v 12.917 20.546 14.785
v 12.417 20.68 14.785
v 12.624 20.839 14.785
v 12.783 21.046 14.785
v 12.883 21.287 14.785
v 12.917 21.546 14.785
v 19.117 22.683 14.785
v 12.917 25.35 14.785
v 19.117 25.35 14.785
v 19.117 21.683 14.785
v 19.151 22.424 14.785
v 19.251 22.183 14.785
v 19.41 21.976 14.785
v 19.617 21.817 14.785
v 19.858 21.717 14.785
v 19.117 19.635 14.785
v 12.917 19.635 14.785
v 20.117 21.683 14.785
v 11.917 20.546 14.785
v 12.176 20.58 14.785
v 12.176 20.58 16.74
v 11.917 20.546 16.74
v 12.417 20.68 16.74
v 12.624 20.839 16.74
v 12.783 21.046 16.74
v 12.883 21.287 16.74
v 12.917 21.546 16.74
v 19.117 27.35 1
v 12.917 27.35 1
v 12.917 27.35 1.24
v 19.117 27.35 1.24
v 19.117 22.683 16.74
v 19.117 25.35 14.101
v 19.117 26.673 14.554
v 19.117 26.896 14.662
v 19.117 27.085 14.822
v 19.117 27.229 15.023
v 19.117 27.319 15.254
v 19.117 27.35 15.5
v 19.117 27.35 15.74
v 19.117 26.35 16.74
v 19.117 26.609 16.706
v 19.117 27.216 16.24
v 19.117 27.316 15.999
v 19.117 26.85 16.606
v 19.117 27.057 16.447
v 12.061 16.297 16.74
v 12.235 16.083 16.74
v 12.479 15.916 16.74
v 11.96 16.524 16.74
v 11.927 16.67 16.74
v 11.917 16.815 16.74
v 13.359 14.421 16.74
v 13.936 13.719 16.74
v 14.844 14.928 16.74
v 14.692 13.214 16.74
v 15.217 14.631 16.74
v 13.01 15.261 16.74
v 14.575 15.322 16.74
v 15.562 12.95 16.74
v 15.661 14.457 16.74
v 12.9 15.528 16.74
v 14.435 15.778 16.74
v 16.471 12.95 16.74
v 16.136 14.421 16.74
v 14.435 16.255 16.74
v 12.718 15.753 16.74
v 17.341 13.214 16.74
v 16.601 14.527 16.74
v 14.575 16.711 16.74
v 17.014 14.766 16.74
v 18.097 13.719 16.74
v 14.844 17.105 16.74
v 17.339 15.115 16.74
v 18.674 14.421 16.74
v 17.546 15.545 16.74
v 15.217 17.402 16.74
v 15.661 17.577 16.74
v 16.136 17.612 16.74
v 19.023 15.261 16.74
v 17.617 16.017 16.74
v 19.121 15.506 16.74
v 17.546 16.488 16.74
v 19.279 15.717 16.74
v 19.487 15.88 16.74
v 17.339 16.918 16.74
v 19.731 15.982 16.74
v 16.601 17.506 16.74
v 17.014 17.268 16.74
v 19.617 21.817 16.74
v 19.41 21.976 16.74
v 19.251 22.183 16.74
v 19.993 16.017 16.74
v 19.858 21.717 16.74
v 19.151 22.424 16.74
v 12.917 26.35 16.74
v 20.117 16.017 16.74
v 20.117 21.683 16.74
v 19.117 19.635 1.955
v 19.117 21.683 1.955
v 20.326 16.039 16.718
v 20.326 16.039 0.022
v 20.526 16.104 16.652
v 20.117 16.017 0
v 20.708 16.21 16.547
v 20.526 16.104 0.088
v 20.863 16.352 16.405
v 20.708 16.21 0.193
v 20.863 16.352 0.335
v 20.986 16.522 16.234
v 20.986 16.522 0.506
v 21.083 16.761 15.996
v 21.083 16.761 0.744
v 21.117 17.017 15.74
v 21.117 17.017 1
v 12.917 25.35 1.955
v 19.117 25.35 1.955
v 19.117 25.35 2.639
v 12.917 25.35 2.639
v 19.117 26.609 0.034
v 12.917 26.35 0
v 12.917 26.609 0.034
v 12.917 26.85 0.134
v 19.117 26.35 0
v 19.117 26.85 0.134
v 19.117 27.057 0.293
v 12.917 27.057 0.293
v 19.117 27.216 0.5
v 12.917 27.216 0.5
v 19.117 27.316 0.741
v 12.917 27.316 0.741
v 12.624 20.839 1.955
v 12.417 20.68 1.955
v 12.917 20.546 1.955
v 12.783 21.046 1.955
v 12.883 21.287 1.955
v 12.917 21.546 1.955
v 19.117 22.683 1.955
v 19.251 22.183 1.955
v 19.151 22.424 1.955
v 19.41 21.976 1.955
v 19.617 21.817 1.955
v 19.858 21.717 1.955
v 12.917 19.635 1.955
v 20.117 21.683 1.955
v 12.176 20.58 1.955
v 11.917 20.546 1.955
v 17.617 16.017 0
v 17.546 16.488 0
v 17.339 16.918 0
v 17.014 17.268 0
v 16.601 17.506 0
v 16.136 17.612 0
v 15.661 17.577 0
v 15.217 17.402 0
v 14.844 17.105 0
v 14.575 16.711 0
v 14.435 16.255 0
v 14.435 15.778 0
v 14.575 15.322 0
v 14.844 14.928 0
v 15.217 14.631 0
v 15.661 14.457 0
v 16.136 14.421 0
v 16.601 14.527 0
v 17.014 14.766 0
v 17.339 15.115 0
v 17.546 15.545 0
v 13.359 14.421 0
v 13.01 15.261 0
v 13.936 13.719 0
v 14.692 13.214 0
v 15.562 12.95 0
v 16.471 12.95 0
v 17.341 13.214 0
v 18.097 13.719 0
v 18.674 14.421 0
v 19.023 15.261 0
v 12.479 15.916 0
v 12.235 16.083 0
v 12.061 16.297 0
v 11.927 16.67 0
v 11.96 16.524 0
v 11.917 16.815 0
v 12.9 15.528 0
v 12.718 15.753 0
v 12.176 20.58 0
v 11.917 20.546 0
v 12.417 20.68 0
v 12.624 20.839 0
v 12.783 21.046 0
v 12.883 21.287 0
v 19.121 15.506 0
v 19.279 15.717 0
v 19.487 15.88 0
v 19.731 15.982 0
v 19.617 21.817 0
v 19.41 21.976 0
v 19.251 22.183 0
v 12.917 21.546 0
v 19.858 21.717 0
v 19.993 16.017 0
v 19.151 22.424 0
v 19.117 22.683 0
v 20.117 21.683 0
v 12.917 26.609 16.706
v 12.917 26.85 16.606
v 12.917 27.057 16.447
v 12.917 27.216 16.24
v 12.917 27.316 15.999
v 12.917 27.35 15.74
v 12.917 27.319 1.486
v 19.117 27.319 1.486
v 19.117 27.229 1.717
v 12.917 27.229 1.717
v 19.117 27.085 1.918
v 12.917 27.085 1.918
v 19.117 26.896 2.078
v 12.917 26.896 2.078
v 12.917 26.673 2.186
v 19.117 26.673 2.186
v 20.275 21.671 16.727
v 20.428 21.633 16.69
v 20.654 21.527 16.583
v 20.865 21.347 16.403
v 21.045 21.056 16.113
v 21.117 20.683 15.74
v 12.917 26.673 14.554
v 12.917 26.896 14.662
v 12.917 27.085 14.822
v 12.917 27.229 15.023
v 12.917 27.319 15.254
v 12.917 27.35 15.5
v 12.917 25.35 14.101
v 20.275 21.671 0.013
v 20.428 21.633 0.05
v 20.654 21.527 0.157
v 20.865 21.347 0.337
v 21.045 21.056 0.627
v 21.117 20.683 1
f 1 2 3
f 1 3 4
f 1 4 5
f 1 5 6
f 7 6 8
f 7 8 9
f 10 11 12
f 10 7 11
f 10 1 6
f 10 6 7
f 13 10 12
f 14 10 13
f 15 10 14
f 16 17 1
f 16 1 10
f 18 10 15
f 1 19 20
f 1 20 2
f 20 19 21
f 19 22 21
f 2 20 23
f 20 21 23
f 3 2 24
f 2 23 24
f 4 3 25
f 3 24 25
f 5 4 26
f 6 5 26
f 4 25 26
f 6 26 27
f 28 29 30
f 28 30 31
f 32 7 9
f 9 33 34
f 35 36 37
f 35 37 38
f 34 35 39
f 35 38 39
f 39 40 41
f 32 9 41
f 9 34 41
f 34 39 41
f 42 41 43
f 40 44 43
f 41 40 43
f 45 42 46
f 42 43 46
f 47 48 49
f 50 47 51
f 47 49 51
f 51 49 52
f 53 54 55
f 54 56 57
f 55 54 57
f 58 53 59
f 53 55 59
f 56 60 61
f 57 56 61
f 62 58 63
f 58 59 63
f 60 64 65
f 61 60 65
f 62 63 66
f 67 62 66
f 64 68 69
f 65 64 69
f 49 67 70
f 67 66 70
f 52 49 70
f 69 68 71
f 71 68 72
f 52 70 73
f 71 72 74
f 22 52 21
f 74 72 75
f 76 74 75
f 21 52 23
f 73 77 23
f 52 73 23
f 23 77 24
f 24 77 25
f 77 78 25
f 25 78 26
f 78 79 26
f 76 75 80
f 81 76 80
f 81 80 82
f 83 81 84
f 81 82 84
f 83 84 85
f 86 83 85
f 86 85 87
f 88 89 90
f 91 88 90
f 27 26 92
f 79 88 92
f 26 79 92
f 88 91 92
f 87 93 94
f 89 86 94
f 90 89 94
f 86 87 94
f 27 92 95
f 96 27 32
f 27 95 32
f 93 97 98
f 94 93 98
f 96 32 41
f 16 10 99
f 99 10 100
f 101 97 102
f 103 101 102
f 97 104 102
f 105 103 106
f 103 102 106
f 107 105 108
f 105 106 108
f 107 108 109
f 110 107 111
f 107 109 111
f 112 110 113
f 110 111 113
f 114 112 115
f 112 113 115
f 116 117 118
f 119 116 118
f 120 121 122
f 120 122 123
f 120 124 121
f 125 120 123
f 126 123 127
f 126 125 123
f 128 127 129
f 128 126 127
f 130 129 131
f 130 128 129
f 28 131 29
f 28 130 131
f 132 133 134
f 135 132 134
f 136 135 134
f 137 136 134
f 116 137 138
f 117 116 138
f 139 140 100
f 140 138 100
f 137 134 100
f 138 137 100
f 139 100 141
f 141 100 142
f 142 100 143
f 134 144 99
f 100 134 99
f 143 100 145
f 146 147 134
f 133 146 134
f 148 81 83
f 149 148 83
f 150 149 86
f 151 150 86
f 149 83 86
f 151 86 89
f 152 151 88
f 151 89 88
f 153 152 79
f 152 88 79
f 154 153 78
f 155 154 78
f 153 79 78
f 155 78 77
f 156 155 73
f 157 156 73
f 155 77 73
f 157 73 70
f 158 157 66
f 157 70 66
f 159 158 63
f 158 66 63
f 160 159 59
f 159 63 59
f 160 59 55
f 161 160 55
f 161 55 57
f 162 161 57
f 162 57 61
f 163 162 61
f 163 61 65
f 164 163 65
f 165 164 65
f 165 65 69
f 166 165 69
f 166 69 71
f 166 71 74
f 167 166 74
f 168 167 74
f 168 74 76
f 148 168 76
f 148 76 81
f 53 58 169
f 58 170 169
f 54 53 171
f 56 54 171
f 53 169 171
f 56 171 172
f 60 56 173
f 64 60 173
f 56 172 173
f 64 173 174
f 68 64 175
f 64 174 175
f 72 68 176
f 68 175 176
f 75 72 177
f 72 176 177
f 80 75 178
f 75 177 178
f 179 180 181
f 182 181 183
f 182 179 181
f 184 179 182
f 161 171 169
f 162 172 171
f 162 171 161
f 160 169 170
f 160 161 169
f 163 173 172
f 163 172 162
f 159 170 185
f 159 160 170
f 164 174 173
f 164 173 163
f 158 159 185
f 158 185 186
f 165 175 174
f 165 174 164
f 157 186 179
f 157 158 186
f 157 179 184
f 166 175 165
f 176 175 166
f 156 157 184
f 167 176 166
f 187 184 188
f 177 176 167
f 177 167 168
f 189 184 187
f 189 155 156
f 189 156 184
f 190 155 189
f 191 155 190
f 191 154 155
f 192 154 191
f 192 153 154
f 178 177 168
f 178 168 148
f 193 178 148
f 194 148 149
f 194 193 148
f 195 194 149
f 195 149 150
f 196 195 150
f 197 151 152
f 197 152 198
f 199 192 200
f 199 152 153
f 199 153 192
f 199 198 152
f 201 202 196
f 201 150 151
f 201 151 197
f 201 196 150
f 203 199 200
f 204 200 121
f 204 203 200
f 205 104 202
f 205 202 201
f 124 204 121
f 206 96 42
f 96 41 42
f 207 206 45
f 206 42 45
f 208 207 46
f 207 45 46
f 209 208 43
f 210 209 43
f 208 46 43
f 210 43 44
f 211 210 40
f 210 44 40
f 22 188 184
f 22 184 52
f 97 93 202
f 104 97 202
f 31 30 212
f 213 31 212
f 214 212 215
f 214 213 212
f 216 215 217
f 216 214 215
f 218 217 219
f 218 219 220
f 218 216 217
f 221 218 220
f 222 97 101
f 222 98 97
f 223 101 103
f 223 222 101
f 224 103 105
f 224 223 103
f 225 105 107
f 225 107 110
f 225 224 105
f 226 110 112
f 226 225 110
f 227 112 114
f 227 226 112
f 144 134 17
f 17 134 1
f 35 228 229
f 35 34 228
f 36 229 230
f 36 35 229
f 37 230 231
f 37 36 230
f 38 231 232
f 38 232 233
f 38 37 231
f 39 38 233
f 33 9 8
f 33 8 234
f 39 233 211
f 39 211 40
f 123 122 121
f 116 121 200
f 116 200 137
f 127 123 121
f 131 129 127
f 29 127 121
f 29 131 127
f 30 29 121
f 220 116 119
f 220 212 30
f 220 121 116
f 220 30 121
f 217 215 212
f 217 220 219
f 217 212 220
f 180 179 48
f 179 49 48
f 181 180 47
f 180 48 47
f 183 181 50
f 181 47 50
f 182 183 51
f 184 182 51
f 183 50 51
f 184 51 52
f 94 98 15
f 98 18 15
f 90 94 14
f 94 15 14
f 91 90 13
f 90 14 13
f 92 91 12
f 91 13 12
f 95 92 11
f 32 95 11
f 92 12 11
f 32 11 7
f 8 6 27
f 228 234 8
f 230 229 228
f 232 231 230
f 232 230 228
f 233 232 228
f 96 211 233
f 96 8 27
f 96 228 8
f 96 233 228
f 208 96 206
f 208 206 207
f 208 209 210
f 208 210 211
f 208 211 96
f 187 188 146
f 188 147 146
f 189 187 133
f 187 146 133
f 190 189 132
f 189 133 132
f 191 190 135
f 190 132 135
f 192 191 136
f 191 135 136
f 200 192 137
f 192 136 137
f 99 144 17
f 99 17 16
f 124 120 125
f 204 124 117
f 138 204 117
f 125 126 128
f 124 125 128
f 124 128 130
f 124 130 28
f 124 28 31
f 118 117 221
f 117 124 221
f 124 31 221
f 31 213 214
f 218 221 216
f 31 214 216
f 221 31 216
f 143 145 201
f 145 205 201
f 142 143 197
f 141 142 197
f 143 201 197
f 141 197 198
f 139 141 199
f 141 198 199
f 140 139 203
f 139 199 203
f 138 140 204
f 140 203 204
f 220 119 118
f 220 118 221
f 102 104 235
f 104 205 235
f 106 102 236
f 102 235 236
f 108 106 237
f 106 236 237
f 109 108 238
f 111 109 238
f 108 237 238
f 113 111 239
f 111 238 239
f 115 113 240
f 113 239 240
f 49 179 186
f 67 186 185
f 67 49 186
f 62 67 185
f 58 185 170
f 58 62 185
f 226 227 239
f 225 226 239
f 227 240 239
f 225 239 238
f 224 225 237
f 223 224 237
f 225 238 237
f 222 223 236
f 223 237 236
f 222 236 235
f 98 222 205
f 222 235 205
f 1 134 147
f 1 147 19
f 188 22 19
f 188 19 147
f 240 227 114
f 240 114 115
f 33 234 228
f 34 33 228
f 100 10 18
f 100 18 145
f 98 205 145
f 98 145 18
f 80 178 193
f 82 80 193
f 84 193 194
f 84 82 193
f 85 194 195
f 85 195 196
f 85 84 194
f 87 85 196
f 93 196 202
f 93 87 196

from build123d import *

# Parameters (mm, degrees)
ESBO_O1_R                = 3.1
ESBO_O1_R_2              = 1.55
RESSALTO_EXTRUS_O1_DEPTH = 16.74
BOSS_EXTRUDE1_DEPTH      = 16.74
SKETCH2_W                = 6.2
SKETCH2_H                = 1.955
BOSS_EXTRUDE2_DEPTH      = 7.715
BOSS_EXTRUDE3_DEPTH      = 6.2
SKETCH5_W                = 16.74
SKETCH5_H                = 5.66650546
BOSS_EXTRUDE4_DEPTH      = 2
SKETCH6_W                = 16.74
SKETCH6_H                = 4.529470895
BOSS_EXTRUDE5_DEPTH      = 1
FILLET1_R                = 1
FILLET4_R                = 1
M3_CLEARANCE_HOLE1_D     = 3.2


with BuildPart() as part:
    # Esboço1 → Ressalto-extrusão1 (new body)
    with BuildSketch(Plane.XY):
        with Locations((16.016666667, 16.016666667)):
            Circle(ESBO_O1_R)
        with Locations((16.016666667, 16.016666667)):
            Circle(ESBO_O1_R_2, mode=Mode.SUBTRACT)
    extrude(amount=RESSALTO_EXTRUS_O1_DEPTH)

    # Sketch1 → Boss-Extrude1 (add)
    with BuildSketch(Plane(origin=(0, 0, 0), x_dir=(-1, 0, 0), z_dir=(0, 0, -1))):
        with BuildLine():
            Line((-12.916666667, 16.016666667), (-12.916666667, 19.634677588))
            Line((-12.916666667, 19.634677588), (-19.116666667, 19.634677588))
            Line((-19.116666667, 19.634677588), (-19.116666667, 16.016666667))
            ThreePointArc((-19.116666667, 16.016666667), (-16.016666667, 19.116666667), (-12.916666667, 16.016666667))
        make_face()
    extrude(amount=-BOSS_EXTRUDE1_DEPTH)

    # Sketch2 → Boss-Extrude2 (add)
    with BuildSketch(Plane(origin=(0, 19.634677588, 0), x_dir=(1, 0, 0), z_dir=(0, 1, 0))):
        with Locations((16.016666667, -0.9775)):
            Rectangle(SKETCH2_W, SKETCH2_H)
        with Locations((16.016666667, -15.7625)):
            Rectangle(SKETCH2_W, SKETCH2_H)
    extrude(amount=BOSS_EXTRUDE2_DEPTH)

    # Sketch4 → Boss-Extrude3 (add)
    with BuildSketch(Plane.ZY.offset(-12.916666667)):
        Polygon((1.955, 27.349677588), (1.955, 25.349677588), (2.639300497, 25.349677588), align=None)
        Polygon((14.100699503, 25.349677588), (14.785, 27.349677588), (14.785, 25.349677588), align=None)
    extrude(amount=-BOSS_EXTRUDE3_DEPTH)

    # Sketch5 → Boss-Extrude4 (add)
    with BuildSketch(Plane(origin=(19.116666667, 0, 0), x_dir=(0, 0, -1), z_dir=(1, 0, 0))):
        with Locations((-8.37, 18.849919397)):
            Rectangle(SKETCH5_W, SKETCH5_H)
    extrude(amount=BOSS_EXTRUDE4_DEPTH)

    # Sketch6 → Boss-Extrude5 (add)
    with BuildSketch(Plane.ZY.offset(-12.916666667)):
        with Locations((8.37, 18.281402115)):
            Rectangle(SKETCH6_W, SKETCH6_H)
    extrude(amount=BOSS_EXTRUDE5_DEPTH)

    # Fillet1
    fillet1_edges = [part.edges().sort_by_distance(p)[0] for p in [
        (21.116666667, 21.683172127, 8.37),
        (21.116666667, 18.849919397, 0),
        (21.116666667, 16.016666667, 8.37),
        (21.116666667, 18.849919397, 16.74),
        (16.016666667, 27.349677588, 0),
        (16.016666667, 27.349677588, 1.955),
        (16.016666667, 27.349677588, 16.74),
        (16.016666667, 27.349677588, 14.785),
        (19.116666667, 21.683172127, 15.7625),
        (12.916666667, 20.546137562, 15.7625),
        (12.916666667, 20.546137562, 0.9775),
        (19.116666667, 21.683172127, 0.9775),
        (12.916666667, 16.016666667, 8.37),
        (19.116666667, 16.016666667, 8.37),
    ]]
    fillet(fillet1_edges, radius=FILLET1_R - 0.0001)  # a hair under: the kernel refuses the full size

    # Fillet4
    fillet4_edges = [part.edges().sort_by_distance(p)[0] for p in [
        (11.916666667, 16.016666667, 8.37),
    ]]
    fillet(fillet4_edges, radius=FILLET4_R)

    # M3 Clearance Hole1 (through all)
    with Locations(Plane(origin=(0, 0, 0), x_dir=(-1, 0, 0), z_dir=(0, 0, -1))):
        with Locations((-16.016666667, 16.016666667)):
            Hole(M3_CLEARANCE_HOLE1_D / 2)


solid = part.part
